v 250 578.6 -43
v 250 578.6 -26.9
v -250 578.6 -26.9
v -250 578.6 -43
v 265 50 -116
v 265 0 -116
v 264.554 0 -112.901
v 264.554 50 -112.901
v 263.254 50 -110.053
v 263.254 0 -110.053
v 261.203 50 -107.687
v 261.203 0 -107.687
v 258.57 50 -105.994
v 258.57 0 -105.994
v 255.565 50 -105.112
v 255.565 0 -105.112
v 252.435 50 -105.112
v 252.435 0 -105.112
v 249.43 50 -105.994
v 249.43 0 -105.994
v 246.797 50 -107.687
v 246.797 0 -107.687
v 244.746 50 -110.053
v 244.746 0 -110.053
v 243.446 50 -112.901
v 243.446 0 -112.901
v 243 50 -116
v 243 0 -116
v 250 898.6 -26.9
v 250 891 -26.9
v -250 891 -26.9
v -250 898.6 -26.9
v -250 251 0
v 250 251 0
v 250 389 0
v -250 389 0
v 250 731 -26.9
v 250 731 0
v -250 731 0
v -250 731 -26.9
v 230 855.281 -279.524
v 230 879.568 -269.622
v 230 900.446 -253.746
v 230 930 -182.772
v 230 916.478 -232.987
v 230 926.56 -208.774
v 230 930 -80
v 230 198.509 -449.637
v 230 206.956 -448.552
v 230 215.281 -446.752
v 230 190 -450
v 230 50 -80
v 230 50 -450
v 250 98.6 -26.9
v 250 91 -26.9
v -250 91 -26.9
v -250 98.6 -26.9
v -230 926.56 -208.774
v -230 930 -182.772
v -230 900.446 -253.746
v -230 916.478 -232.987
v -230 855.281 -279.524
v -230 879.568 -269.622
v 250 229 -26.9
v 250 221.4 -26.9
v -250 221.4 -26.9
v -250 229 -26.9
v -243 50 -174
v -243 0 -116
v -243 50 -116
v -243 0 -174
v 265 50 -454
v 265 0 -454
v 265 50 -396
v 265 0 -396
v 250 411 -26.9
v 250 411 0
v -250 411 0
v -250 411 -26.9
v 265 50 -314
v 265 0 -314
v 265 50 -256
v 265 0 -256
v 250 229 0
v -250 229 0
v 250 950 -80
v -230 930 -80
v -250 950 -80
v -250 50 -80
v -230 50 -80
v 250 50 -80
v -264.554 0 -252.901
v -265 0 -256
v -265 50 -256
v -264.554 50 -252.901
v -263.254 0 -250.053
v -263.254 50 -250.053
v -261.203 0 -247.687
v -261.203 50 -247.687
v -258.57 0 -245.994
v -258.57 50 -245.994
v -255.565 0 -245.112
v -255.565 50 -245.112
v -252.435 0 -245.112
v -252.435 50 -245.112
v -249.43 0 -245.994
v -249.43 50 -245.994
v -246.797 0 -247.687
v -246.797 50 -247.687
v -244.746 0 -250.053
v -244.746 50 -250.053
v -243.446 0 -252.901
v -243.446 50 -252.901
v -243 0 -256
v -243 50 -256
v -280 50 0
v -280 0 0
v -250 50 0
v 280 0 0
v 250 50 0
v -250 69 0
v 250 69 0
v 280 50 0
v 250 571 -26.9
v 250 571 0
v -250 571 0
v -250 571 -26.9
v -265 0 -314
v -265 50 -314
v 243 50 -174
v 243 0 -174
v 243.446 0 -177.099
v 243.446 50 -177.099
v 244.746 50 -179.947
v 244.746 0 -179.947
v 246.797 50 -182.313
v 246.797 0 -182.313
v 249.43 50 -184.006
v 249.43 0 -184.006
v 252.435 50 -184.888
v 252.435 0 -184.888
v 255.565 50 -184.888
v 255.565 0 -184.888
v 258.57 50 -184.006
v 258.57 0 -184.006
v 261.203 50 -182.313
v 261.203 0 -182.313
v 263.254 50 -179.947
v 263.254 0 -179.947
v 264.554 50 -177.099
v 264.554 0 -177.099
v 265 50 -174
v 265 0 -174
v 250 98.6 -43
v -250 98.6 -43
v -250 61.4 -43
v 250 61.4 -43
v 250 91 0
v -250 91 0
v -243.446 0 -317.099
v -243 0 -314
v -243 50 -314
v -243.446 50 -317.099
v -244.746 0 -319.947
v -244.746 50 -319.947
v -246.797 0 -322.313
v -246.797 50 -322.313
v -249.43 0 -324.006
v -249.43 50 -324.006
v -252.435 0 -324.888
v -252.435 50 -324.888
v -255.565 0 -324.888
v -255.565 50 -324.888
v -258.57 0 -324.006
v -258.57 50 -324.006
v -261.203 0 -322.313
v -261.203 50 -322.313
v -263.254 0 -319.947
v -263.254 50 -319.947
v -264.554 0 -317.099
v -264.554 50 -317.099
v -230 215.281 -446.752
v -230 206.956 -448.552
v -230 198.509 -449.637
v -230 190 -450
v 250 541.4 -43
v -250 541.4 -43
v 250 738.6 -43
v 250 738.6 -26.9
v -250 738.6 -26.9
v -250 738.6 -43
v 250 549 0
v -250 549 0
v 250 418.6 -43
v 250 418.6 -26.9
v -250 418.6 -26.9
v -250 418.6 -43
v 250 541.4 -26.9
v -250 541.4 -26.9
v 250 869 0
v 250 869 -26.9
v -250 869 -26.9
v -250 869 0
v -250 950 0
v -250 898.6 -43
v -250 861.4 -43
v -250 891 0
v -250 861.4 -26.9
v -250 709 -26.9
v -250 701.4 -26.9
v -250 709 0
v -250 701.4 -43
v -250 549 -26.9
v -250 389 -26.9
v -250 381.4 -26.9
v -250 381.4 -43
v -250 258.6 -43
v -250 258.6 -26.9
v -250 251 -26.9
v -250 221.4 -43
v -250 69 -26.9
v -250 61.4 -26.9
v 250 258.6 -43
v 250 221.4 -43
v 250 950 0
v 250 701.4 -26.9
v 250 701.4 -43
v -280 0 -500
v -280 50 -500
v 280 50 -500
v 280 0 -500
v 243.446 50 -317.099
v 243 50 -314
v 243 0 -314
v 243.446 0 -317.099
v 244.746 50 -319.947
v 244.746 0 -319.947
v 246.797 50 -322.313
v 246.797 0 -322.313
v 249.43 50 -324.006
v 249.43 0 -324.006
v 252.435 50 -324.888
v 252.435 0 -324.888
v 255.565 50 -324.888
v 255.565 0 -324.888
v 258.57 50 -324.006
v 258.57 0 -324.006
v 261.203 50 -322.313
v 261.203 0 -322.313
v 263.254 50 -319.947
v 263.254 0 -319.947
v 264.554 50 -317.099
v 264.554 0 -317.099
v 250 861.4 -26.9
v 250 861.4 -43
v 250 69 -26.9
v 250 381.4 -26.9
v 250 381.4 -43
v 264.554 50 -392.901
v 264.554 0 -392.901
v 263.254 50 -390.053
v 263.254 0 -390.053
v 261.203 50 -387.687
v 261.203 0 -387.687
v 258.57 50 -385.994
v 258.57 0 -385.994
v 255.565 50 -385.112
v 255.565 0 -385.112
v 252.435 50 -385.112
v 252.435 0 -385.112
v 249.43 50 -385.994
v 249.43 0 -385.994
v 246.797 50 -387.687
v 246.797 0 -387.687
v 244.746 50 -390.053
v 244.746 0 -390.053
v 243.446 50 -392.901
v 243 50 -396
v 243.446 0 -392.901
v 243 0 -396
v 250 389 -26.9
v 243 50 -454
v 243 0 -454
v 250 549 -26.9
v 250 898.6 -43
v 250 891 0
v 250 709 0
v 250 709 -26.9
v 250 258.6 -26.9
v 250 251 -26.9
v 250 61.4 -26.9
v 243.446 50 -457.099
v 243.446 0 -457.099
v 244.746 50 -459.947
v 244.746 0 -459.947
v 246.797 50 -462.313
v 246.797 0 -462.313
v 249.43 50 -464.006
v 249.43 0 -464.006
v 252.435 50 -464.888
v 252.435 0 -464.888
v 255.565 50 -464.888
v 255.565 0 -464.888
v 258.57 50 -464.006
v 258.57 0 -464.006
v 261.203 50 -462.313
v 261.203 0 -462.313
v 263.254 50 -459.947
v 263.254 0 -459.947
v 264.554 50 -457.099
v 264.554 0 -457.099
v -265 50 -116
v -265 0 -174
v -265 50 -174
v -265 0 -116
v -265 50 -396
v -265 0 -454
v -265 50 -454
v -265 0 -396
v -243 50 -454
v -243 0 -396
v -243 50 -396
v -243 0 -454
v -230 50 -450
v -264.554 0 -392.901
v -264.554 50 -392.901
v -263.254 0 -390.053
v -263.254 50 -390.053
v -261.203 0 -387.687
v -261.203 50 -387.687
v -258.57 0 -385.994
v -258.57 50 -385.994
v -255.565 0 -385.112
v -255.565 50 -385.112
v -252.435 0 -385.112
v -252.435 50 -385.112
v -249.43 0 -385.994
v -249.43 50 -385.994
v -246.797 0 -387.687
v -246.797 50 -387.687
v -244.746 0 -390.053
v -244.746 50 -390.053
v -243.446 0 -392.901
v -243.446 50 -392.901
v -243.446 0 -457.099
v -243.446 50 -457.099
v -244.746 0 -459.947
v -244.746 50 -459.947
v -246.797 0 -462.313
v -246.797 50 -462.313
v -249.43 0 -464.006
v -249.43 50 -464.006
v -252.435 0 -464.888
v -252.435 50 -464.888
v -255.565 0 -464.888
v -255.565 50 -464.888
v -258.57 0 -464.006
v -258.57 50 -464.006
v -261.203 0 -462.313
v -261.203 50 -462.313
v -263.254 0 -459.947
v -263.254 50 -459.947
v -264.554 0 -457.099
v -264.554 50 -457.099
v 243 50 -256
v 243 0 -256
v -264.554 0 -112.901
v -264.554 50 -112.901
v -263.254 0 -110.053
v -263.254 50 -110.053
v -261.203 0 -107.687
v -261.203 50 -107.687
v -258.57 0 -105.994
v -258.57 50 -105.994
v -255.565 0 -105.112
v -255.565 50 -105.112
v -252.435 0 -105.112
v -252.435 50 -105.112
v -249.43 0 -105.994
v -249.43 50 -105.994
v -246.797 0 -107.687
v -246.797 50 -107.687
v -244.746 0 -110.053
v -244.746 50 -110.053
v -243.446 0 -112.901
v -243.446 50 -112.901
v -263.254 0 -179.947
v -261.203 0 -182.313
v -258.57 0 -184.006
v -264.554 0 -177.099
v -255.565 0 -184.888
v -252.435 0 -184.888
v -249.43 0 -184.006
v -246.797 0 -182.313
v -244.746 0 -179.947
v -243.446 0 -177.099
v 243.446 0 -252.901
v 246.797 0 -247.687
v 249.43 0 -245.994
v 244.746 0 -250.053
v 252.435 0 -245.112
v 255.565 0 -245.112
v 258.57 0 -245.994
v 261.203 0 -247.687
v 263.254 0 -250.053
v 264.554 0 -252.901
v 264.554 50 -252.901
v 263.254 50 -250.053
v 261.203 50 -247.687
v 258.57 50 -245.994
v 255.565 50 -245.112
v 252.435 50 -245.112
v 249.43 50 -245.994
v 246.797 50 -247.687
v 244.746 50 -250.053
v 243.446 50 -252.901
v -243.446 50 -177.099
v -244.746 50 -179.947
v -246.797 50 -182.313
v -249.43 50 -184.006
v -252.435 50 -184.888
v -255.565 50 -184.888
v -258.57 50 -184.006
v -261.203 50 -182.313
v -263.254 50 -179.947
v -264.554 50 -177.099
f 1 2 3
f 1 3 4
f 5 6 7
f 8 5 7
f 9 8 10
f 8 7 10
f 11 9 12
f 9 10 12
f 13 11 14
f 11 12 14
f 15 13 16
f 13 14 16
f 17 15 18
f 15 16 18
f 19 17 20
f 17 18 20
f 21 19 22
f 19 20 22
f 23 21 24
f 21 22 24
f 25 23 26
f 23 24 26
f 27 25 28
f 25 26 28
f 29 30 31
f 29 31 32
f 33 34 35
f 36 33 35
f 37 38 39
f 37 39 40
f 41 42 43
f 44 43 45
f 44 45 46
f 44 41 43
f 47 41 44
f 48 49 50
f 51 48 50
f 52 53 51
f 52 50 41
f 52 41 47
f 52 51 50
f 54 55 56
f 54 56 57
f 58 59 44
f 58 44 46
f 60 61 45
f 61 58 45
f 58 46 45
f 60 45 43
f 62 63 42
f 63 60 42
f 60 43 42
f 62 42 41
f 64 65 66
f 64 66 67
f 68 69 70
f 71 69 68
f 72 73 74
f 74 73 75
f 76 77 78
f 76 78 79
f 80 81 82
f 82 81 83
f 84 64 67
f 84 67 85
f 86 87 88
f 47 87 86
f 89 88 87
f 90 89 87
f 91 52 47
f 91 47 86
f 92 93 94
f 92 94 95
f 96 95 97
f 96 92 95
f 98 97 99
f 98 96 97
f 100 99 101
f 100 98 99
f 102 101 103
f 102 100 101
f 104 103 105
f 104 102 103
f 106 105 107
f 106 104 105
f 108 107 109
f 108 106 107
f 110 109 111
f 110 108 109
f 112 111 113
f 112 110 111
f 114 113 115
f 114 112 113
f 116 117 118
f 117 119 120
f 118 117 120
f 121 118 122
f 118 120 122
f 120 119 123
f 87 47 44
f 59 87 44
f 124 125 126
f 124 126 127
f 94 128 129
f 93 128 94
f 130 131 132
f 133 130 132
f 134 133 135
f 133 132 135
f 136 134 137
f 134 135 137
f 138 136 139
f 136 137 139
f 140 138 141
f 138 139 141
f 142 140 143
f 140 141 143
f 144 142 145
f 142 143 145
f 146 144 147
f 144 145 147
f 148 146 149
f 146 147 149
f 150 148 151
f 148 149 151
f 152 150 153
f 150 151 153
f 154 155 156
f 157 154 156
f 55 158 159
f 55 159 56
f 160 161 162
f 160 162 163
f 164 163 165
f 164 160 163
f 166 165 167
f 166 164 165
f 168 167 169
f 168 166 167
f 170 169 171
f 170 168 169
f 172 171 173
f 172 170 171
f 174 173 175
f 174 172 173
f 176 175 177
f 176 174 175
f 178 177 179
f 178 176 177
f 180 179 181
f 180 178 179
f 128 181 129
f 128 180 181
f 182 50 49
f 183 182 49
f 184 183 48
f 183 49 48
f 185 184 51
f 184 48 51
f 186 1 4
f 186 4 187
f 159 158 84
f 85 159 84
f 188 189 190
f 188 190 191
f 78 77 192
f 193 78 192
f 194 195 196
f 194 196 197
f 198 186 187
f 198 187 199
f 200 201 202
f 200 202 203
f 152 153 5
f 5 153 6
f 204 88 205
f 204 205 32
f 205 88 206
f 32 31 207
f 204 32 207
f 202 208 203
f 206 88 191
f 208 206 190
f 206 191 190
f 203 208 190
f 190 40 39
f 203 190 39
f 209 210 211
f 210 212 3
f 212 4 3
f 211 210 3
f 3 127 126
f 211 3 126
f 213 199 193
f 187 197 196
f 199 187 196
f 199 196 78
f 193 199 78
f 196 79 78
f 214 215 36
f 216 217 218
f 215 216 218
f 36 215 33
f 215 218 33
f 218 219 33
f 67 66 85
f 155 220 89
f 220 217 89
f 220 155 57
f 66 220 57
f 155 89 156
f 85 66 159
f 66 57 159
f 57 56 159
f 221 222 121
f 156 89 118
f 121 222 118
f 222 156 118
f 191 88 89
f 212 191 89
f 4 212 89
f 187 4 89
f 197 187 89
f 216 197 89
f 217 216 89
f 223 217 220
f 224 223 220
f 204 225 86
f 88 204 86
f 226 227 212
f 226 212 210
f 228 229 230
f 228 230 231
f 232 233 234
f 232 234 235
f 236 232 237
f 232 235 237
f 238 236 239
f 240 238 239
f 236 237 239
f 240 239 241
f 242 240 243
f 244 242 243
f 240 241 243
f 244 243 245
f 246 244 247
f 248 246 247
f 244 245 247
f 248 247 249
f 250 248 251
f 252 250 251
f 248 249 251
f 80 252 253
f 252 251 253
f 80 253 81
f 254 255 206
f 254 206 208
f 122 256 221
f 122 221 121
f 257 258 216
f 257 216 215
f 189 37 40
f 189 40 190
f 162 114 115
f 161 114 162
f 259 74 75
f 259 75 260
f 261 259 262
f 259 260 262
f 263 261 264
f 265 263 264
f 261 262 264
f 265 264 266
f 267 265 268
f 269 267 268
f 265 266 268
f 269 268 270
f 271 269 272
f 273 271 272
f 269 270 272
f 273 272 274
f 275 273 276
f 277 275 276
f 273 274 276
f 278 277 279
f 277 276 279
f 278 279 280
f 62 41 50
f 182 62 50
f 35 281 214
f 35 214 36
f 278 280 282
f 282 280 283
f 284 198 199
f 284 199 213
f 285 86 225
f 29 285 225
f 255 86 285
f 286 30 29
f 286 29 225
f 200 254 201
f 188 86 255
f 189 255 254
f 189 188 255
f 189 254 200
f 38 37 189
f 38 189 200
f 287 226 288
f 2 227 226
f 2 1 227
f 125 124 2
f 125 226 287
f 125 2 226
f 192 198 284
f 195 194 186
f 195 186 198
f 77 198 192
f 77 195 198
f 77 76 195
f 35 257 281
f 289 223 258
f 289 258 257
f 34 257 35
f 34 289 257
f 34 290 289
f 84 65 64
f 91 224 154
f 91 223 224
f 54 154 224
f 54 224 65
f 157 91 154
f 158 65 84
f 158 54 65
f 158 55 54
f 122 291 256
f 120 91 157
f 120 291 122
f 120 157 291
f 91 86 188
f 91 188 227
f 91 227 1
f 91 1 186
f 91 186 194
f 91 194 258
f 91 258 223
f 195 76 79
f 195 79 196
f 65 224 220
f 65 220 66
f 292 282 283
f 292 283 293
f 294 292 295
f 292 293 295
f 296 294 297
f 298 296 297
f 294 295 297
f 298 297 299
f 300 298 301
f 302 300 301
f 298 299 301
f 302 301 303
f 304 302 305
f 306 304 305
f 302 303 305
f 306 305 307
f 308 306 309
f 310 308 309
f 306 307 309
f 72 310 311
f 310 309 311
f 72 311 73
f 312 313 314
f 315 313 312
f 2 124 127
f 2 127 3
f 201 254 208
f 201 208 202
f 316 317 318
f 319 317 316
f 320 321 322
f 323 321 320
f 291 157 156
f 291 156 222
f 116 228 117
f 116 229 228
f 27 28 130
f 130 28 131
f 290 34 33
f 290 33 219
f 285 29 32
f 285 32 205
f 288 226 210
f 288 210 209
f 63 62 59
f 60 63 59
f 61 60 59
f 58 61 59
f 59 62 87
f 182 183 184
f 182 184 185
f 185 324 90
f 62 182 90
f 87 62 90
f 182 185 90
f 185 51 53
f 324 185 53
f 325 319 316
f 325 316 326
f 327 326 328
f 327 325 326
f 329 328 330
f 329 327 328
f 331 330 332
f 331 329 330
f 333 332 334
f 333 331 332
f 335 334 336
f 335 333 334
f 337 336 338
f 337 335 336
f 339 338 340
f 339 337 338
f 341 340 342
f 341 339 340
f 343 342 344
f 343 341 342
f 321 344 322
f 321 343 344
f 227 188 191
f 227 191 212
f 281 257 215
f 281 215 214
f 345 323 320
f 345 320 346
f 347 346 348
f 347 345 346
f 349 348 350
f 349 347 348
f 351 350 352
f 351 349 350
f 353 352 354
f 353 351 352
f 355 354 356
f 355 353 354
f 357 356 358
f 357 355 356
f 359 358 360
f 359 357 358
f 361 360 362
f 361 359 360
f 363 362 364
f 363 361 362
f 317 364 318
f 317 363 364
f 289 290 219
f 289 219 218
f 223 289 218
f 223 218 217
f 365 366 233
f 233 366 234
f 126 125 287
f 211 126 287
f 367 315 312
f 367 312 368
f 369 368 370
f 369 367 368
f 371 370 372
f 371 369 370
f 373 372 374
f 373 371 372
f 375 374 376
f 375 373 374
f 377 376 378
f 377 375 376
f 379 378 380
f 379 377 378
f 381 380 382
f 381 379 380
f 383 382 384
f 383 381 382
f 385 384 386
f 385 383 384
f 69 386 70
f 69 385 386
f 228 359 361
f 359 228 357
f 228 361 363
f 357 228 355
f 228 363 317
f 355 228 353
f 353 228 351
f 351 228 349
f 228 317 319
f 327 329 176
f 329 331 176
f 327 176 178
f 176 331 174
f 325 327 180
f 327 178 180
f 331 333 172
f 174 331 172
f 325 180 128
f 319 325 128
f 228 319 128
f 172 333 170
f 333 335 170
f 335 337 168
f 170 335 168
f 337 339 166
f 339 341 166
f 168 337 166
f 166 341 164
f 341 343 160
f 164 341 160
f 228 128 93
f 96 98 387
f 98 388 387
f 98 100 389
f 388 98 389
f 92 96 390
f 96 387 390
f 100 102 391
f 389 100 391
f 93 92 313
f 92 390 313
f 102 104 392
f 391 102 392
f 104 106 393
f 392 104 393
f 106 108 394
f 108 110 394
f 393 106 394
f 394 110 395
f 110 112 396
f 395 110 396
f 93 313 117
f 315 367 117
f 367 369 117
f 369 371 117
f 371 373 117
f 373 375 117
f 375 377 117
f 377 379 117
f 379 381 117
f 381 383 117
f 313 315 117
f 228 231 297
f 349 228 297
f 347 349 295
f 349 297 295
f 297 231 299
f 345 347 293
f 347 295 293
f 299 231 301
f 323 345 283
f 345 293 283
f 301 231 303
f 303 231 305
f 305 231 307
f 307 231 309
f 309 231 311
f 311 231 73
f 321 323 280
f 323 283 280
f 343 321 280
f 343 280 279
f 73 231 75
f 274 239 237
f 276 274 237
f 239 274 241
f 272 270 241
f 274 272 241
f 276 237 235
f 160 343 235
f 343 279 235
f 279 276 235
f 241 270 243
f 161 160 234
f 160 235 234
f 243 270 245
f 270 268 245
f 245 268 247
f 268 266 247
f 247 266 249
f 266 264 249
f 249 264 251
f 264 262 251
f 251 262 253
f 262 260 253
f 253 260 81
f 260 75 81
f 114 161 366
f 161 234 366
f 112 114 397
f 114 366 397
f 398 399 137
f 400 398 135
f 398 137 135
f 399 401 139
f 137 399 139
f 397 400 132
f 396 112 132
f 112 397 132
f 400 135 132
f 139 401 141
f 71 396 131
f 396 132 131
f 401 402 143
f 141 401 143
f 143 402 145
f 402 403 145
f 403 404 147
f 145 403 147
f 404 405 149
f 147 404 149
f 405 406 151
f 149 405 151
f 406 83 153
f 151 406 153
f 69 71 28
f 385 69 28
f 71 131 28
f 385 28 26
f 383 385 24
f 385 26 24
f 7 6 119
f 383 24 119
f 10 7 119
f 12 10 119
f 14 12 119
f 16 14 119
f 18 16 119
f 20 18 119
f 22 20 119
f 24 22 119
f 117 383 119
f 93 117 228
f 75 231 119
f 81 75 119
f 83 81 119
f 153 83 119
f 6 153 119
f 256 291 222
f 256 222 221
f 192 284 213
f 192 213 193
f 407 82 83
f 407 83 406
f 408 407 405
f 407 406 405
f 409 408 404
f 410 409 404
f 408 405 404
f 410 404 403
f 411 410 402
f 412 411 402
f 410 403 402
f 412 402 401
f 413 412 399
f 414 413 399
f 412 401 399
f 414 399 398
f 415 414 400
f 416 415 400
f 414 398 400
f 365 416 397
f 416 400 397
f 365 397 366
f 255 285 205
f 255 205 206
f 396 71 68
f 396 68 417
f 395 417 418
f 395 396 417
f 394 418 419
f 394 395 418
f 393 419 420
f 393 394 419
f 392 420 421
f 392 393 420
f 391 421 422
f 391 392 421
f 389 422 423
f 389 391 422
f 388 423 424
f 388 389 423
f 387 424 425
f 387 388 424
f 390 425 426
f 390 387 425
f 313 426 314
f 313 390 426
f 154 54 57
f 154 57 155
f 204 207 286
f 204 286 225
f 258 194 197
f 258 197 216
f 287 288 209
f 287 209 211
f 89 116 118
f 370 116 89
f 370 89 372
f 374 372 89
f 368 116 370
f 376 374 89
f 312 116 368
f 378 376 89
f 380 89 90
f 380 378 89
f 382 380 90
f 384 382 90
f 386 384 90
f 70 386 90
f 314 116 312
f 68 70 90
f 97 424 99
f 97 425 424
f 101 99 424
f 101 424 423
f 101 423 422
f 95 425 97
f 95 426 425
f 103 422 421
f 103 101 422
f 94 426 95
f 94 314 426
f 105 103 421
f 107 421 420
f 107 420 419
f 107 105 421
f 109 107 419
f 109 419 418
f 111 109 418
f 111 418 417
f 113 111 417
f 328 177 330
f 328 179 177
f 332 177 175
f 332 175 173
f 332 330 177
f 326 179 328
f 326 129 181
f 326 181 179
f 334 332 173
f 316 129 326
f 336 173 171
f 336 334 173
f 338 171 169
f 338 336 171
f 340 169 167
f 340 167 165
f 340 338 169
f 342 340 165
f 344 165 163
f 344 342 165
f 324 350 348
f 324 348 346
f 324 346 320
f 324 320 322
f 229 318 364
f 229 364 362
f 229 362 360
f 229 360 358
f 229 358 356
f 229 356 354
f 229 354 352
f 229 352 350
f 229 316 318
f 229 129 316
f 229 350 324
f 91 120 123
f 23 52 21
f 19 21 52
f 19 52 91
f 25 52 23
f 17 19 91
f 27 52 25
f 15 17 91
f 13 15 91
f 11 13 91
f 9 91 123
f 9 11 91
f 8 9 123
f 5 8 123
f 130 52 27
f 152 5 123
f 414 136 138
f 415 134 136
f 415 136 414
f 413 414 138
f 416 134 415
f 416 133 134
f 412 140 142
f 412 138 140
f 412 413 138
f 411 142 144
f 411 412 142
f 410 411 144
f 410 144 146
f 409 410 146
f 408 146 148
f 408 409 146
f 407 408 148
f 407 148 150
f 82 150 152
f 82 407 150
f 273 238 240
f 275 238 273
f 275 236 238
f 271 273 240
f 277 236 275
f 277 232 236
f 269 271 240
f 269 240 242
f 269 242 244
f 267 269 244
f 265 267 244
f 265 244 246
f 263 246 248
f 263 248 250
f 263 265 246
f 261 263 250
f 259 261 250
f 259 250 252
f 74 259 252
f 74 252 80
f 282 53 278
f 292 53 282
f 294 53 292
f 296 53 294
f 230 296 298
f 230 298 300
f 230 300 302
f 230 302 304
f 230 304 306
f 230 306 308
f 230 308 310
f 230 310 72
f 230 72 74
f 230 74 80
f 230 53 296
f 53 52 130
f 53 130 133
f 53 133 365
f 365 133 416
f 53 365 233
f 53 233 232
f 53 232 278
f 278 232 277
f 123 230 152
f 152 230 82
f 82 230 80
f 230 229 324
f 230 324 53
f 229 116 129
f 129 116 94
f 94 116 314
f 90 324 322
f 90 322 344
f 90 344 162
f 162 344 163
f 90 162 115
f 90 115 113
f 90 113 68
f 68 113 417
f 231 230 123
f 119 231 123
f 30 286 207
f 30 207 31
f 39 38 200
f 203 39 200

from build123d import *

# Parameters (mm, degrees)
BOSS_EXTRUDE1_DEPTH  = 280
CUT_EXTRUDE2_REACH   = 1068.958
CUT_EXTRUDE3_REACH   = 1111.459
LPATTERN2_COUNT      = 3
LPATTERN2_PITCH      = 140
CUT_EXTRUDE1_REACH   = 1212.826
LPATTERN1_COUNT      = 6
LPATTERN1_PITCH      = 160
MIRROR1_COPY_1_REACH = 1111.459
MIRROR1_COPY_2_REACH = 1111.459


with BuildPart() as part:
    # Sketch4 → Boss-Extrude1 (new, symmetric)
    with BuildSketch(Plane(origin=(0, 0, 0), x_dir=(0, 0, -1), z_dir=(1, 0, 0))):
        with BuildLine():
            Line((0, 0), (0, 950))
            Line((0, 950), (80, 950))
            Line((80, 950), (80, 930))
            Line((80, 930), (182.772011822, 930))
            ThreePointArc((182.772011822, 930), (243.894588799, 909.145628961), (279.523707794, 855.280611672))
            Line((279.523707794, 855.280611672), (446.751695972, 215.280611672))
            ThreePointArc((446.751695972, 215.280611672), (449.184599604, 202.744222275), (450, 190))
            Line((450, 190), (450, 50))
            Line((450, 50), (500, 50))
            Line((500, 50), (500, 0))
            Line((500, 0), (0, 0))
        make_face()
    extrude(amount=BOSS_EXTRUDE1_DEPTH, both=True)

    # Sketch9 → Cut-Extrude2 (cut, up to next)
    with BuildSketch(Plane(origin=(0, 50, 0), x_dir=(1, 0, 0), z_dir=(0, 1, 0)), mode=Mode.PRIVATE) as cut_extrude2_sk1:
        Polygon((-230, 80), (-250, 80), (-250, -10), (-330, -10), (-330, 560), (-230, 560), align=None)
    cut_extrude2_tool1 = extrude(cut_extrude2_sk1.sketch, amount=CUT_EXTRUDE2_REACH, mode=Mode.PRIVATE) & part.part
    cut_extrude2 = cut_extrude2_tool1.solids().sort_by_distance((-281.304348, 50, -282.826087))[0]
    add(cut_extrude2, mode=Mode.SUBTRACT)

    # Sketch10 → Cut-Extrude3 (cut, up to next)
    with BuildSketch(Plane.XZ, mode=Mode.PRIVATE) as cut_extrude3_sk1:
        with BuildLine():
            Line((-243, -116), (-243, -174))
            ThreePointArc((-243, -174), (-254, -185), (-265, -174))
            Line((-265, -174), (-265, -116))
            ThreePointArc((-265, -116), (-254, -105), (-243, -116))
        make_face()
    cut_extrude3_tool1 = extrude(cut_extrude3_sk1.sketch, amount=-CUT_EXTRUDE3_REACH, mode=Mode.PRIVATE) & part.part
    cut_extrude3 = cut_extrude3_tool1.solids().sort_by_distance((-254, 0, -145))[0]
    add(cut_extrude3, mode=Mode.SUBTRACT)

    # LPattern2: Cut-Extrude3 ×3
    with Locations(*[(0, 0, -i * LPATTERN2_PITCH) for i in range(1, LPATTERN2_COUNT)]):
        add(cut_extrude3, mode=Mode.SUBTRACT)

    # Sketch6 → Cut-Extrude1 (cut, up to next)
    with BuildSketch(Plane(origin=(280, 0, 0), x_dir=(0, 0, -1), z_dir=(1, 0, 0)), mode=Mode.PRIVATE) as cut_extrude1_sk1:
        Polygon((0, 69), (0, 91), (26.9, 91), (26.9, 98.6), (43, 98.6), (43, 61.4), (26.9, 61.4), (26.9, 69), align=None)
    cut_extrude1_tool1 = extrude(cut_extrude1_sk1.sketch, amount=-CUT_EXTRUDE1_REACH, mode=Mode.PRIVATE) & part.part
    cut_extrude1 = cut_extrude1_tool1.solids().sort_by_distance((280, 80, -24.26428))[0]
    add(cut_extrude1, mode=Mode.SUBTRACT)

    # LPattern1: Cut-Extrude1 ×6
    with Locations(*[(0, i * LPATTERN1_PITCH, 0) for i in range(1, LPATTERN1_COUNT)]):
        add(cut_extrude1, mode=Mode.SUBTRACT)

    # Mirror1: Cut-Extrude2, Cut-Extrude3 across plane
    add(cut_extrude2.mirror(Plane(origin=(0, 0, 0), x_dir=(0, 0, 1), z_dir=(1, 0, 0))), mode=Mode.SUBTRACT)
    add(cut_extrude3.mirror(Plane(origin=(0, 0, 0), x_dir=(0, 0, 1), z_dir=(1, 0, 0))), mode=Mode.SUBTRACT)

    # Mirror1 copy 1 sketch → Mirror1 copy 1 (cut, up to next)
    with BuildSketch(Plane(origin=(0, 0, -140), x_dir=(-1, 0, 0), z_dir=(0, -1, 0)), mode=Mode.PRIVATE) as mirror1_copy_1_sk1:
        with BuildLine():
            Line((-243, 116), (-243, 174))
            ThreePointArc((-243, 174), (-254, 185), (-265, 174))
            Line((-265, 174), (-265, 116))
            ThreePointArc((-265, 116), (-254, 105), (-243, 116))
        make_face()
    mirror1_copy_1_tool1 = extrude(mirror1_copy_1_sk1.sketch, amount=-MIRROR1_COPY_1_REACH, mode=Mode.PRIVATE) & part.part
    add(mirror1_copy_1_tool1.solids().sort_by_distance((254, 0, -285))[0], mode=Mode.SUBTRACT)

    # Mirror1 copy 2 sketch → Mirror1 copy 2 (cut, up to next)
    with BuildSketch(Plane(origin=(0, 0, -280), x_dir=(-1, 0, 0), z_dir=(0, -1, 0)), mode=Mode.PRIVATE) as mirror1_copy_2_sk1:
        with BuildLine():
            Line((-243, 116), (-243, 174))
            ThreePointArc((-243, 174), (-254, 185), (-265, 174))
            Line((-265, 174), (-265, 116))
            ThreePointArc((-265, 116), (-254, 105), (-243, 116))
        make_face()
    mirror1_copy_2_tool1 = extrude(mirror1_copy_2_sk1.sketch, amount=-MIRROR1_COPY_2_REACH, mode=Mode.PRIVATE) & part.part
    add(mirror1_copy_2_tool1.solids().sort_by_distance((254, 0, -425))[0], mode=Mode.SUBTRACT)


solid = part.part
